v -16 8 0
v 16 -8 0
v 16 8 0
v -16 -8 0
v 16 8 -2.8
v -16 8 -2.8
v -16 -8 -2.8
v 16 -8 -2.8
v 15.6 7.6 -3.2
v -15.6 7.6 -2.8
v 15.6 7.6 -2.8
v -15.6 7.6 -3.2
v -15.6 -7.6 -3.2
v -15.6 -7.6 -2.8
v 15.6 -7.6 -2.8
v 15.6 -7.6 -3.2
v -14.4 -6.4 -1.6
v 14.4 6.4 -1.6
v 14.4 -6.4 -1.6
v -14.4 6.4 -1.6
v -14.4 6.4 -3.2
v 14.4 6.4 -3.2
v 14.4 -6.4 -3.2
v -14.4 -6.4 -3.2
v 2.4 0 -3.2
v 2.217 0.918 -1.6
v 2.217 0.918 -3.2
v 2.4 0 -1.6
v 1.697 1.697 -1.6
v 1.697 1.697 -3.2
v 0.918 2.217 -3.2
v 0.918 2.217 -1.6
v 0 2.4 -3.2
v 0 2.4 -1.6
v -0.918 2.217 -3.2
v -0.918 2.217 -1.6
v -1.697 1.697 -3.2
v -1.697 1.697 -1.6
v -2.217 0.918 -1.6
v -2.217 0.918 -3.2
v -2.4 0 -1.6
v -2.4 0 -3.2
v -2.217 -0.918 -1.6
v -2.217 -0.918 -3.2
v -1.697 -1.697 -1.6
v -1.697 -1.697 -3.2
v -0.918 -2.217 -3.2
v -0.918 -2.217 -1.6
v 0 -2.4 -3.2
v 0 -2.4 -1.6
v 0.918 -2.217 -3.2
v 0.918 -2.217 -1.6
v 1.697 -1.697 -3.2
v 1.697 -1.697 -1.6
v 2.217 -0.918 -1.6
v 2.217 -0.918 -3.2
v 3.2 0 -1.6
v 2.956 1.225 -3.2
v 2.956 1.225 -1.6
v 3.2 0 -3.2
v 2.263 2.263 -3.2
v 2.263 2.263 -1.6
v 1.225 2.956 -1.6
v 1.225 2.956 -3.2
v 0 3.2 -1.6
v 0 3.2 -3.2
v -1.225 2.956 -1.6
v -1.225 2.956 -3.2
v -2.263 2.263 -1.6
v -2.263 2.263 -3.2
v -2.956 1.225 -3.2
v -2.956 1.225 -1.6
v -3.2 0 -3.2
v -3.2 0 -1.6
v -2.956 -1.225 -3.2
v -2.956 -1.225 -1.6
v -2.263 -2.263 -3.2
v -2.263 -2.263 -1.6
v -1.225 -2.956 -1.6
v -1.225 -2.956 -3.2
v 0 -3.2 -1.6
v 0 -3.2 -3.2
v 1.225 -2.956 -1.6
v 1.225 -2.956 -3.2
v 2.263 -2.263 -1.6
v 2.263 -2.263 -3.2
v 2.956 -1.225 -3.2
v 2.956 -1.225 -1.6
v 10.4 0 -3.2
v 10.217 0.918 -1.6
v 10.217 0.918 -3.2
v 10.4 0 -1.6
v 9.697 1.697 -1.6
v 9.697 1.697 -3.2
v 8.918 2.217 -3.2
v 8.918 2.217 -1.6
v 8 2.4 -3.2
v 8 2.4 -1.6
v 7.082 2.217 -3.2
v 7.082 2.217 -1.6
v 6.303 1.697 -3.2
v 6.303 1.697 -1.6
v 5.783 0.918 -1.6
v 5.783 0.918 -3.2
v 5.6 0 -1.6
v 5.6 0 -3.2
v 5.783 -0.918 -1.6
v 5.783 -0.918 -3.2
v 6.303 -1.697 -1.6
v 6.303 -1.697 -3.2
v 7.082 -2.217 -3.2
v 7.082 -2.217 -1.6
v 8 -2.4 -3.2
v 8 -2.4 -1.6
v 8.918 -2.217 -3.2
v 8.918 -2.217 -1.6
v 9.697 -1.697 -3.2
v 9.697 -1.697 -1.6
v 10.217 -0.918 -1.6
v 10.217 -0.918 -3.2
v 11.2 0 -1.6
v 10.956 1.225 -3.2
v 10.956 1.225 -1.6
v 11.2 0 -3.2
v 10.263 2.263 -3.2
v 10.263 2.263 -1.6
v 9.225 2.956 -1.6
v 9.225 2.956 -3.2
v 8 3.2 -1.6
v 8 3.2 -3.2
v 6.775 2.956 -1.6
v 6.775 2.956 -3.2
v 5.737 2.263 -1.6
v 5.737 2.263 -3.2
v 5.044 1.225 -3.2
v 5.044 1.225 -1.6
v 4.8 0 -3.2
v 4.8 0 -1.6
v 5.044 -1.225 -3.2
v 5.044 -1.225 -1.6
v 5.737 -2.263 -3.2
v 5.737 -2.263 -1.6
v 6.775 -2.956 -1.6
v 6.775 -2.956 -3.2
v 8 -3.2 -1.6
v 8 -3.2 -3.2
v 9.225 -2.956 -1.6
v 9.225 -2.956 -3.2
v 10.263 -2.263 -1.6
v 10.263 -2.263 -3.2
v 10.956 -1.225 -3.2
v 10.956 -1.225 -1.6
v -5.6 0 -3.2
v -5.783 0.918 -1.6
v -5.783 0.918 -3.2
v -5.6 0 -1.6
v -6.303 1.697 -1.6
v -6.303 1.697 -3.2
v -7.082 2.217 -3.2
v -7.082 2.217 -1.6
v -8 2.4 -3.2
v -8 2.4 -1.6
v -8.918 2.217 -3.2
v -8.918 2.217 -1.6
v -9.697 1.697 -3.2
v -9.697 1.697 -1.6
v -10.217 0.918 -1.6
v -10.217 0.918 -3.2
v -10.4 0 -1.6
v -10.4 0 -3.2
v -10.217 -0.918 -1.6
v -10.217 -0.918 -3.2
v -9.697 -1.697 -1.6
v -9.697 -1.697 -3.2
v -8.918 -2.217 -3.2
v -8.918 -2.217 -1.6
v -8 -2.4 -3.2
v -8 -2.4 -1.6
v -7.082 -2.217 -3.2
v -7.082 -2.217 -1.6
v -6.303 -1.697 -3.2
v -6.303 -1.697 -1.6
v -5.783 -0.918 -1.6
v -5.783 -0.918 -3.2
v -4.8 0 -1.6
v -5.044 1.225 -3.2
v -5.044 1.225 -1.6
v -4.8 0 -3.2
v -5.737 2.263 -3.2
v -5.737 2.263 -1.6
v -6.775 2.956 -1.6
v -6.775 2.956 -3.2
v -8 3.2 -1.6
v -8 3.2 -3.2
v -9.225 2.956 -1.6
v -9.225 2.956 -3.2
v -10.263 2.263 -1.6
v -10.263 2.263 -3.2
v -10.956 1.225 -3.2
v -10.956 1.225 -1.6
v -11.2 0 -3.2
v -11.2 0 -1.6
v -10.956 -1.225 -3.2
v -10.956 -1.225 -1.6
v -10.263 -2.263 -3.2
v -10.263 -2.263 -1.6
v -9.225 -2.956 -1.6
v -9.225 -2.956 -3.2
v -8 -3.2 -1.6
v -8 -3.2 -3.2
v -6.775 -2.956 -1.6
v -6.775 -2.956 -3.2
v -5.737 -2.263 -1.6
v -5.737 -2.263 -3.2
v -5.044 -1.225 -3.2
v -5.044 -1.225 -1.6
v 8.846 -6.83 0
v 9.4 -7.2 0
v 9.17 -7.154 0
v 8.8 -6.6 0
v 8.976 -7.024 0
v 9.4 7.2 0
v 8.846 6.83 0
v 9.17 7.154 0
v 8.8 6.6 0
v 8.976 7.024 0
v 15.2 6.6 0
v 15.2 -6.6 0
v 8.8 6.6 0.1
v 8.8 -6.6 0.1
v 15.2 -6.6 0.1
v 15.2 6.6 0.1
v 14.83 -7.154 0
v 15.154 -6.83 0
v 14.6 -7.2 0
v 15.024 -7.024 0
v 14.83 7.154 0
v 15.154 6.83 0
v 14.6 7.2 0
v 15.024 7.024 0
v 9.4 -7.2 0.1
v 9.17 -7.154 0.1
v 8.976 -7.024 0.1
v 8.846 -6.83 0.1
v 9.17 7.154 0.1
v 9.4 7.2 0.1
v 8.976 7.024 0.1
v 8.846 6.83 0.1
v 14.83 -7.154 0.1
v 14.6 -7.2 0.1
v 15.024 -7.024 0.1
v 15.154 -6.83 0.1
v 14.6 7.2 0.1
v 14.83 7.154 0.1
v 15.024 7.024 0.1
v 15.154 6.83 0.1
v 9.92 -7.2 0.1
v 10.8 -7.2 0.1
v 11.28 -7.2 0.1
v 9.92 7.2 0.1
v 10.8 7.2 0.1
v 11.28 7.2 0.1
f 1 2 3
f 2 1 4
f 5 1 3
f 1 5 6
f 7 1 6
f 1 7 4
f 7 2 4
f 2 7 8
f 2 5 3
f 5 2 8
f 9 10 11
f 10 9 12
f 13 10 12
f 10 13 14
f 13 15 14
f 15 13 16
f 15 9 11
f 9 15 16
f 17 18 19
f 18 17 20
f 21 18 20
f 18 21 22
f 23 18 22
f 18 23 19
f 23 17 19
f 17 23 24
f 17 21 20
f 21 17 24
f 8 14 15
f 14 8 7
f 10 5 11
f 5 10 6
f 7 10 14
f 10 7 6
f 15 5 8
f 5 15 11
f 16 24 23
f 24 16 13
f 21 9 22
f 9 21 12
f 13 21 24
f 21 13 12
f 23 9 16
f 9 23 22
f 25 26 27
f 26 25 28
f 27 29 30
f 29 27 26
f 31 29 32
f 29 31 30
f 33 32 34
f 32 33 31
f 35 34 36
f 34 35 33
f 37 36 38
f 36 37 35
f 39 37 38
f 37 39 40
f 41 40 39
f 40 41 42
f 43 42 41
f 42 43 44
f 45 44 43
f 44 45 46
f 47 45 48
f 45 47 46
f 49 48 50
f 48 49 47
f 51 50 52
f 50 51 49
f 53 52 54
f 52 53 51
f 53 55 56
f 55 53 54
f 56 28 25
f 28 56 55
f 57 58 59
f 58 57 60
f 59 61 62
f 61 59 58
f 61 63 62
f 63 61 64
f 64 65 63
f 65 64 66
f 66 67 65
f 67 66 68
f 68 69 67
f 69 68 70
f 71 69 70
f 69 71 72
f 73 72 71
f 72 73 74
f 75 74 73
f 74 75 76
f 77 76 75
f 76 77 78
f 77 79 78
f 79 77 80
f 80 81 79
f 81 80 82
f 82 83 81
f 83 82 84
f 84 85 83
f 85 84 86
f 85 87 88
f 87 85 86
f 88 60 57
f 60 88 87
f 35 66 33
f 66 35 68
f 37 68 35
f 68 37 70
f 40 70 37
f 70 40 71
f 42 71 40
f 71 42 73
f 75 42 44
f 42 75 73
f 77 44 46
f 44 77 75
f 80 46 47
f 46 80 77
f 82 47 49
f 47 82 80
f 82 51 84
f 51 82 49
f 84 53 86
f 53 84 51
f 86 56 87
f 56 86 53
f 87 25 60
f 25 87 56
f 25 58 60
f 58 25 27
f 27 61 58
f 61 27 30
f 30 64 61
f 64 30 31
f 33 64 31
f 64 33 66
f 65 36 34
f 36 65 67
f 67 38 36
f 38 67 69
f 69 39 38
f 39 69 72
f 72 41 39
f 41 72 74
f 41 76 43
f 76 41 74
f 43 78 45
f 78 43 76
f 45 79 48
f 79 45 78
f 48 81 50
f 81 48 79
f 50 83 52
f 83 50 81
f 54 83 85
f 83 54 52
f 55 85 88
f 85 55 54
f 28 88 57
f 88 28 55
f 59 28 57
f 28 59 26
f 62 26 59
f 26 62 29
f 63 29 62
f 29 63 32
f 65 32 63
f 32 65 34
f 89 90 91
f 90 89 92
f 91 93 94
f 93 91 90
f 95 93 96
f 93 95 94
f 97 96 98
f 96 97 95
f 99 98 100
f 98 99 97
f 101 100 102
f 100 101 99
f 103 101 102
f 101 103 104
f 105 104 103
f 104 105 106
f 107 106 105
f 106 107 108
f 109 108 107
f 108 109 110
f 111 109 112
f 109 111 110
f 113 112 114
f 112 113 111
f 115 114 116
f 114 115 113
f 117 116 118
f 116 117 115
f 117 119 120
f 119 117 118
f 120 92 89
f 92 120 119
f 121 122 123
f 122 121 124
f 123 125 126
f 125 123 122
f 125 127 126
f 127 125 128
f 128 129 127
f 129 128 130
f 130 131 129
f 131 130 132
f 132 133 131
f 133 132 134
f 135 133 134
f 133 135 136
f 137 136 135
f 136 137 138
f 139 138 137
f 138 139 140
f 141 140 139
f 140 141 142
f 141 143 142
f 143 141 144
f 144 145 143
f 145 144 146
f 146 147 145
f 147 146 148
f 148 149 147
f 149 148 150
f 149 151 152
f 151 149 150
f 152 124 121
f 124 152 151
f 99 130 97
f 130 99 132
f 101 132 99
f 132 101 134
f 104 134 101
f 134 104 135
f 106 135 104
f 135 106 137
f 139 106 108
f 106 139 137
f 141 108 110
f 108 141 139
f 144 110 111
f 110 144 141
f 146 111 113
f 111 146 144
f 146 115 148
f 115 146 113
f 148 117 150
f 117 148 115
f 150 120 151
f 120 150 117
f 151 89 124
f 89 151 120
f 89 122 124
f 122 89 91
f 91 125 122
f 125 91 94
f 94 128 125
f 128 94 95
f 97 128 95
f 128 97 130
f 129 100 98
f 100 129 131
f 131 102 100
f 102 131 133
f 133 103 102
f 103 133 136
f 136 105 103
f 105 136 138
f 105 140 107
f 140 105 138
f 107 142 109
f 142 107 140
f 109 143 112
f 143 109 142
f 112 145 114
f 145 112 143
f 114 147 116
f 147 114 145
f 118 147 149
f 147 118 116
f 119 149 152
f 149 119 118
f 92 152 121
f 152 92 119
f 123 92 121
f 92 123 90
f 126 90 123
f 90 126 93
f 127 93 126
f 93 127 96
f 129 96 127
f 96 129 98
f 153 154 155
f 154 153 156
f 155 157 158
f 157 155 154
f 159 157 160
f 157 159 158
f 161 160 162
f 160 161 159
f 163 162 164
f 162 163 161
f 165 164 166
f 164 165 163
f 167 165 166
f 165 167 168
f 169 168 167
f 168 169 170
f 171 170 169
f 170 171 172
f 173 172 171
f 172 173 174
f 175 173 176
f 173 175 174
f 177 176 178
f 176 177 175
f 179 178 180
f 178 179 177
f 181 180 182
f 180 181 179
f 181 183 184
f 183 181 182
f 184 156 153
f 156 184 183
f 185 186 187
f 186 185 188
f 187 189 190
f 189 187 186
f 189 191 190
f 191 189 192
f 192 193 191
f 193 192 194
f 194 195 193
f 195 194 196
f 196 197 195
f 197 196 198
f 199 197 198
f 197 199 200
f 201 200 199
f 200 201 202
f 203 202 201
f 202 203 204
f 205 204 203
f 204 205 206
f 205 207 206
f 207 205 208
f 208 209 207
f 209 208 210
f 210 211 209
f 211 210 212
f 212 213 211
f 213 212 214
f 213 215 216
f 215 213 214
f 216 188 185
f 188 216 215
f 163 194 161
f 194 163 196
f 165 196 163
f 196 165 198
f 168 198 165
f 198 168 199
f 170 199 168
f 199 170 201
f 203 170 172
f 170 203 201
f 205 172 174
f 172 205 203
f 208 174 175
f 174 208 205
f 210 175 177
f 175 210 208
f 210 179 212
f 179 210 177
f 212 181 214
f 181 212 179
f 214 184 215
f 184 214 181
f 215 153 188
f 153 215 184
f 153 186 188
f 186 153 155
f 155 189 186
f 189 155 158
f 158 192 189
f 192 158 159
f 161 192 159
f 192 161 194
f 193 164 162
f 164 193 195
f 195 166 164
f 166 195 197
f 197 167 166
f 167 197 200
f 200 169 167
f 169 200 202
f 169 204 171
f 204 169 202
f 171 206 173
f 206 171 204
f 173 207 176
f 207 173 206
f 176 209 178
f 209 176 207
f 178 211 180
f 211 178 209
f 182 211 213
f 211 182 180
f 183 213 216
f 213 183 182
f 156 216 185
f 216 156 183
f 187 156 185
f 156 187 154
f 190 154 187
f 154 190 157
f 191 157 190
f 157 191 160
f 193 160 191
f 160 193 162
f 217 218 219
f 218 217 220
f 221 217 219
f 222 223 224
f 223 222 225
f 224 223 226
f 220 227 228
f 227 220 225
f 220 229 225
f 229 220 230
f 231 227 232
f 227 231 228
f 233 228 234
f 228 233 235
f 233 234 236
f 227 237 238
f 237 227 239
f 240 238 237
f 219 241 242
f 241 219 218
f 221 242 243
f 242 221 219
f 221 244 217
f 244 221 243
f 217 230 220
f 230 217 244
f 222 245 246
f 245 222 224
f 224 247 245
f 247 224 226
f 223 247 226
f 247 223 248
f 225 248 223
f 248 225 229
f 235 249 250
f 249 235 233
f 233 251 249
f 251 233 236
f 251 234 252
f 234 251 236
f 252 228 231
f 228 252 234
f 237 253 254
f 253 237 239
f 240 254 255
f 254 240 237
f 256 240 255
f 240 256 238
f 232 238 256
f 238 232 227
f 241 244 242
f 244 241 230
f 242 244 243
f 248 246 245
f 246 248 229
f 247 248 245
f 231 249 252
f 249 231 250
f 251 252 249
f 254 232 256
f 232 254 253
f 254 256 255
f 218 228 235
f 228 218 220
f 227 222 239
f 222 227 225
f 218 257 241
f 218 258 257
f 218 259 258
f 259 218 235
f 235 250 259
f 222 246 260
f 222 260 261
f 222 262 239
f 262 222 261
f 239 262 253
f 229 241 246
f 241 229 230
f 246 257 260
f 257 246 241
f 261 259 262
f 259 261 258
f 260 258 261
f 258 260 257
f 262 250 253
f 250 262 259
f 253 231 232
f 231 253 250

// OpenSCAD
// file: ../p/4-4ring3.scad
use <../lib.scad>
$fa=1; $fs=0.2;
function ldraw_lib__4_4ring3(realsolid=false) = [
// 0 Ring  3 x 1.0
// 0 Name: 4-4ring3.dat
// 0 Author: James Jessiman
// 0 !LDRAW_ORG Primitive UPDATE 2009-01
// 0 !LICENSE Licensed under CC BY 2.0 and CC BY 4.0 : see CAreadme.txt
// 
// 0 BFC CERTIFY CCW
  [0,"BFC","CERTIFY"],
  [0,"BFC","CCW"],
// 
// 0 !HISTORY 1998-12-15 [PTadmin] Official Update 1998-10
// 0 !HISTORY 2002-04-05 [hafhead] Added BFC statement
// 0 !HISTORY 2002-04-25 [PTadmin] Official Update 2002-02
// 0 !HISTORY 2007-06-24 [PTadmin] Header formatted for Contributor Agreement
// 0 !HISTORY 2008-07-01 [PTadmin] Official Update 2008-01
// 0 !HISTORY 2008-08-26 [cwdee] Switch polygon winding and rename
// 0 !HISTORY 2009-05-02 [PTadmin] Official Update 2009-01
// 
// 
// 4 16 -1.5308 0 3.6956 -1.1481 0 2.7717 0 0 3 0 0 4
  [4,16,-1.5308,0,3.6956,-1.1481,0,2.7717,0,0,3,0,0,4],
// 4 16 -2.8284 0 2.8284 -2.1213 0 2.1213 -1.1481 0 2.7717 -1.5308 0 3.6956
  [4,16,-2.8284,0,2.8284,-2.1213,0,2.1213,-1.1481,0,2.7717,-1.5308,0,3.6956],
// 4 16 -3.6956 0 1.5308 -2.7717 0 1.1481 -2.1213 0 2.1213 -2.8284 0 2.8284
  [4,16,-3.6956,0,1.5308,-2.7717,0,1.1481,-2.1213,0,2.1213,-2.8284,0,2.8284],
// 4 16 -4 0 0 -3 0 0 -2.7717 0 1.1481 -3.6956 0 1.5308
  [4,16,-4,0,0,-3,0,0,-2.7717,0,1.1481,-3.6956,0,1.5308],
// 4 16 -3.6956 0 -1.5308 -2.7717 0 -1.1481 -3 0 0 -4 0 0
  [4,16,-3.6956,0,-1.5308,-2.7717,0,-1.1481,-3,0,0,-4,0,0],
// 4 16 -2.8284 0 -2.8284 -2.1213 0 -2.1213 -2.7717 0 -1.1481 -3.6956 0 -1.5308
  [4,16,-2.8284,0,-2.8284,-2.1213,0,-2.1213,-2.7717,0,-1.1481,-3.6956,0,-1.5308],
// 4 16 -1.5308 0 -3.6956 -1.1481 0 -2.7717 -2.1213 0 -2.1213 -2.8284 0 -2.8284
  [4,16,-1.5308,0,-3.6956,-1.1481,0,-2.7717,-2.1213,0,-2.1213,-2.8284,0,-2.8284],
// 4 16 0 0 -4 0 0 -3 -1.1481 0 -2.7717 -1.5308 0 -3.6956
  [4,16,0,0,-4,0,0,-3,-1.1481,0,-2.7717,-1.5308,0,-3.6956],
// 4 16 1.5308 0 -3.6956 1.1481 0 -2.7717 0 0 -3 0 0 -4
  [4,16,1.5308,0,-3.6956,1.1481,0,-2.7717,0,0,-3,0,0,-4],
// 4 16 2.8284 0 -2.8284 2.1213 0 -2.1213 1.1481 0 -2.7717 1.5308 0 -3.6956
  [4,16,2.8284,0,-2.8284,2.1213,0,-2.1213,1.1481,0,-2.7717,1.5308,0,-3.6956],
// 4 16 3.6956 0 -1.5308 2.7717 0 -1.1481 2.1213 0 -2.1213 2.8284 0 -2.8284
  [4,16,3.6956,0,-1.5308,2.7717,0,-1.1481,2.1213,0,-2.1213,2.8284,0,-2.8284],
// 4 16 4 0 0 3 0 0 2.7717 0 -1.1481 3.6956 0 -1.5308
  [4,16,4,0,0,3,0,0,2.7717,0,-1.1481,3.6956,0,-1.5308],
// 4 16 3.6956 0 1.5308 2.7717 0 1.1481 3 0 0 4 0 0
  [4,16,3.6956,0,1.5308,2.7717,0,1.1481,3,0,0,4,0,0],
// 4 16 2.8284 0 2.8284 2.1213 0 2.1213 2.7717 0 1.1481 3.6956 0 1.5308
  [4,16,2.8284,0,2.8284,2.1213,0,2.1213,2.7717,0,1.1481,3.6956,0,1.5308],
// 4 16 1.5308 0 3.6956 1.1481 0 2.7717 2.1213 0 2.1213 2.8284 0 2.8284
  [4,16,1.5308,0,3.6956,1.1481,0,2.7717,2.1213,0,2.1213,2.8284,0,2.8284],
// 4 16 0 0 4 0 0 3 1.1481 0 2.7717 1.5308 0 3.6956
  [4,16,0,0,4,0,0,3,1.1481,0,2.7717,1.5308,0,3.6956],
// 0
];
module ldraw_lib__4_4ring3(step=0, col=false, unit=2/5, alt=false, line=0.2, solid=!$preview)
    makepoly(ldraw_lib__4_4ring3(solid), step=step, col=col, unit=unit, alt=alt, line=line, solid=solid);
ldraw_lib__4_4ring3(line=0.2);
// file: ../p/4-4edge.scad
use <../lib.scad>
function ldraw_lib__4_4edge() = [
// 0 Circle 1.0
// 0 Name: 4-4edge.dat
// 0 Author: James Jessiman
// 0 !LDRAW_ORG Primitive UPDATE 2017-01
// 0 !LICENSE Licensed under CC BY 2.0 and CC BY 4.0 : see CAreadme.txt
// 
// 0 BFC CERTIFY CCW
  [0,"BFC","CERTIFY"],
  [0,"BFC","CCW"],
// 
// 0 !HISTORY 1998-12-15 [PTadmin] Official Update 1998-10
// 0 !HISTORY 2005-12-28 [PTadmin] Official Update 2005-01
// 0 !HISTORY 2007-06-24 [PTadmin] Header formatted for Contributor Agreement
// 0 !HISTORY 2008-07-01 [PTadmin] Official Update 2008-01
// 0 !HISTORY 2017-01-15 [Steffen] BFCed
// 0 !HISTORY 2017-12-30 [PTadmin] Official Update 2017-01
// 
// 
// 2 24 1 0 0 0.9239 0 0.3827
  [2,24,1,0,0,0.9239,0,0.3827],
// 2 24 0.9239 0 0.3827 0.7071 0 0.7071
  [2,24,0.9239,0,0.3827,0.7071,0,0.7071],
// 2 24 0.7071 0 0.7071 0.3827 0 0.9239
  [2,24,0.7071,0,0.7071,0.3827,0,0.9239],
// 2 24 0.3827 0 0.9239 0 0 1
  [2,24,0.3827,0,0.9239,0,0,1],
// 2 24 0 0 1 -0.3827 0 0.9239
  [2,24,0,0,1,-0.3827,0,0.9239],
// 2 24 -0.3827 0 0.9239 -0.7071 0 0.7071
  [2,24,-0.3827,0,0.9239,-0.7071,0,0.7071],
// 2 24 -0.7071 0 0.7071 -0.9239 0 0.3827
  [2,24,-0.7071,0,0.7071,-0.9239,0,0.3827],
// 2 24 -0.9239 0 0.3827 -1 0 -0
  [2,24,-0.9239,0,0.3827,-1,0,-0],
// 2 24 -1 0 -0 -0.9239 0 -0.3827
  [2,24,-1,0,-0,-0.9239,0,-0.3827],
// 2 24 -0.9239 0 -0.3827 -0.7071 0 -0.7071
  [2,24,-0.9239,0,-0.3827,-0.7071,0,-0.7071],
// 2 24 -0.7071 0 -0.7071 -0.3827 0 -0.9239
  [2,24,-0.7071,0,-0.7071,-0.3827,0,-0.9239],
// 2 24 -0.3827 0 -0.9239 0 0 -1
  [2,24,-0.3827,0,-0.9239,0,0,-1],
// 2 24 0 0 -1 0.3827 0 -0.9239
  [2,24,0,0,-1,0.3827,0,-0.9239],
// 2 24 0.3827 0 -0.9239 0.7071 0 -0.7071
  [2,24,0.3827,0,-0.9239,0.7071,0,-0.7071],
// 2 24 0.7071 0 -0.7071 0.9239 0 -0.3827
  [2,24,0.7071,0,-0.7071,0.9239,0,-0.3827],
// 2 24 0.9239 0 -0.3827 1 0 0
  [2,24,0.9239,0,-0.3827,1,0,0],
];
module ldraw_lib__4_4edge(step=0, col=false, unit=2/5, alt=false, line=0.2, solid=!$preview)
    makepoly(ldraw_lib__4_4edge(), step=step, col=col, unit=unit, alt=alt, line=line, solid=solid);
ldraw_lib__4_4edge(line=0.2);
// file: ../p/4-4cyli.scad
use <../lib.scad>
$fa=1; $fs=0.2;
function ldraw_lib__4_4cyli(realsolid=false) = [
// 0 Cylinder 1.0
// 0 Name: 4-4cyli.dat
// 0 Author: James Jessiman
// 0 !LDRAW_ORG Primitive UPDATE 2005-01
// 0 !LICENSE Licensed under CC BY 2.0 and CC BY 4.0 : see CAreadme.txt
// 
// 0 BFC CERTIFY CCW
  [0,"BFC","CERTIFY"],
  [0,"BFC","CCW"],
// 
// 0 !HISTORY 1998-12-15 [PTadmin] Official Update 1998-10
// 0 !HISTORY 2002-03-23 [sbliss] Added BFC statement; merged headers from files in distributions LDraw 0.27 and Complete.
// 0 !HISTORY 2002-04-25 [PTadmin] Official Update 2002-02
// 0 !HISTORY 2004-12-14 [guyvivan] BFC CCW
// 0 !HISTORY 2005-12-28 [PTadmin] Official Update 2005-01
// 0 !HISTORY 2007-06-24 [PTadmin] Header formatted for Contributor Agreement
// 0 !HISTORY 2008-07-01 [PTadmin] Official Update 2008-01
// 
// 
// 4 16 1 1 0 0.9239 1 0.3827 0.9239 0 0.3827 1 0 0
  [4,16,1,1,0,0.9239,1,0.3827,0.9239,0,0.3827,1,0,0],
// 5 24 1 0 0 1 1 0 0.9239 0 0.3827 0.9239 0 -0.3827
  [5,24,1,0,0,1,1,0,0.9239,0,0.3827,0.9239,0,-0.3827],
// 4 16 0.9239 1 0.3827 0.7071 1 0.7071 0.7071 0 0.7071 0.9239 0 0.3827
  [4,16,0.9239,1,0.3827,0.7071,1,0.7071,0.7071,0,0.7071,0.9239,0,0.3827],
// 5 24 0.9239 0 0.3827 0.9239 1 0.3827 0.7071 0 0.7071 1 0 0
  [5,24,0.9239,0,0.3827,0.9239,1,0.3827,0.7071,0,0.7071,1,0,0],
// 4 16 0.7071 1 0.7071 0.3827 1 0.9239 0.3827 0 0.9239 0.7071 0 0.7071
  [4,16,0.7071,1,0.7071,0.3827,1,0.9239,0.3827,0,0.9239,0.7071,0,0.7071],
// 5 24 0.7071 0 0.7071 0.7071 1 0.7071 0.3827 0 0.9239 0.9239 0 0.3827
  [5,24,0.7071,0,0.7071,0.7071,1,0.7071,0.3827,0,0.9239,0.9239,0,0.3827],
// 4 16 0.3827 1 0.9239 0 1 1 0 0 1 0.3827 0 0.9239
  [4,16,0.3827,1,0.9239,0,1,1,0,0,1,0.3827,0,0.9239],
// 5 24 0.3827 0 0.9239 0.3827 1 0.9239 0 0 1 0.7071 0 0.7071
  [5,24,0.3827,0,0.9239,0.3827,1,0.9239,0,0,1,0.7071,0,0.7071],
// 4 16 0 1 1 -0.3827 1 0.9239 -0.3827 0 0.9239 0 0 1
  [4,16,0,1,1,-0.3827,1,0.9239,-0.3827,0,0.9239,0,0,1],
// 5 24 0 0 1 0 1 1 -0.3827 0 0.9239 0.3827 0 0.9239
  [5,24,0,0,1,0,1,1,-0.3827,0,0.9239,0.3827,0,0.9239],
// 4 16 -0.3827 1 0.9239 -0.7071 1 0.7071 -0.7071 0 0.7071 -0.3827 0 0.9239
  [4,16,-0.3827,1,0.9239,-0.7071,1,0.7071,-0.7071,0,0.7071,-0.3827,0,0.9239],
// 5 24 -0.3827 0 0.9239 -0.3827 1 0.9239 -0.7071 0 0.7071 0 0 1
  [5,24,-0.3827,0,0.9239,-0.3827,1,0.9239,-0.7071,0,0.7071,0,0,1],
// 4 16 -0.7071 1 0.7071 -0.9239 1 0.3827 -0.9239 0 0.3827 -0.7071 0 0.7071
  [4,16,-0.7071,1,0.7071,-0.9239,1,0.3827,-0.9239,0,0.3827,-0.7071,0,0.7071],
// 5 24 -0.7071 0 0.7071 -0.7071 1 0.7071 -0.9239 0 0.3827 -0.3827 0 0.9239
  [5,24,-0.7071,0,0.7071,-0.7071,1,0.7071,-0.9239,0,0.3827,-0.3827,0,0.9239],
// 4 16 -0.9239 1 0.3827 -1 1 0 -1 0 0 -0.9239 0 0.3827
  [4,16,-0.9239,1,0.3827,-1,1,0,-1,0,0,-0.9239,0,0.3827],
// 5 24 -0.9239 0 0.3827 -0.9239 1 0.3827 -1 0 0 -0.7071 0 0.7071
  [5,24,-0.9239,0,0.3827,-0.9239,1,0.3827,-1,0,0,-0.7071,0,0.7071],
// 4 16 -1 1 0 -0.9239 1 -0.3827 -0.9239 0 -0.3827 -1 0 0
  [4,16,-1,1,0,-0.9239,1,-0.3827,-0.9239,0,-0.3827,-1,0,0],
// 5 24 -1 0 0 -1 1 0 -0.9239 0 -0.3827 -0.9239 0 0.3827
  [5,24,-1,0,0,-1,1,0,-0.9239,0,-0.3827,-0.9239,0,0.3827],
// 4 16 -0.9239 1 -0.3827 -0.7071 1 -0.7071 -0.7071 0 -0.7071 -0.9239 0 -0.3827
  [4,16,-0.9239,1,-0.3827,-0.7071,1,-0.7071,-0.7071,0,-0.7071,-0.9239,0,-0.3827],
// 5 24 -0.9239 0 -0.3827 -0.9239 1 -0.3827 -0.7071 0 -0.7071 -1 0 0
  [5,24,-0.9239,0,-0.3827,-0.9239,1,-0.3827,-0.7071,0,-0.7071,-1,0,0],
// 4 16 -0.7071 1 -0.7071 -0.3827 1 -0.9239 -0.3827 0 -0.9239 -0.7071 0 -0.7071
  [4,16,-0.7071,1,-0.7071,-0.3827,1,-0.9239,-0.3827,0,-0.9239,-0.7071,0,-0.7071],
// 5 24 -0.7071 0 -0.7071 -0.7071 1 -0.7071 -0.3827 0 -0.9239 -0.9239 0 -0.3827
  [5,24,-0.7071,0,-0.7071,-0.7071,1,-0.7071,-0.3827,0,-0.9239,-0.9239,0,-0.3827],
// 4 16 -0.3827 1 -0.9239 0 1 -1 0 0 -1 -0.3827 0 -0.9239
  [4,16,-0.3827,1,-0.9239,0,1,-1,0,0,-1,-0.3827,0,-0.9239],
// 5 24 -0.3827 0 -0.9239 -0.3827 1 -0.9239 0 0 -1 -0.7071 0 -0.7071
  [5,24,-0.3827,0,-0.9239,-0.3827,1,-0.9239,0,0,-1,-0.7071,0,-0.7071],
// 4 16 0 1 -1 0.3827 1 -0.9239 0.3827 0 -0.9239 0 0 -1
  [4,16,0,1,-1,0.3827,1,-0.9239,0.3827,0,-0.9239,0,0,-1],
// 5 24 0 0 -1 0 1 -1 0.3827 0 -0.9239 -0.3827 0 -0.9239
  [5,24,0,0,-1,0,1,-1,0.3827,0,-0.9239,-0.3827,0,-0.9239],
// 4 16 0.3827 1 -0.9239 0.7071 1 -0.7071 0.7071 0 -0.7071 0.3827 0 -0.9239
  [4,16,0.3827,1,-0.9239,0.7071,1,-0.7071,0.7071,0,-0.7071,0.3827,0,-0.9239],
// 5 24 0.3827 0 -0.9239 0.3827 1 -0.9239 0.7071 0 -0.7071 0 0 -1
  [5,24,0.3827,0,-0.9239,0.3827,1,-0.9239,0.7071,0,-0.7071,0,0,-1],
// 4 16 0.7071 1 -0.7071 0.9239 1 -0.3827 0.9239 0 -0.3827 0.7071 0 -0.7071
  [4,16,0.7071,1,-0.7071,0.9239,1,-0.3827,0.9239,0,-0.3827,0.7071,0,-0.7071],
// 5 24 0.7071 0 -0.7071 0.7071 1 -0.7071 0.9239 0 -0.3827 0.3827 0 -0.9239
  [5,24,0.7071,0,-0.7071,0.7071,1,-0.7071,0.9239,0,-0.3827,0.3827,0,-0.9239],
// 4 16 0.9239 1 -0.3827 1 1 0 1 0 0 0.9239 0 -0.3827
  [4,16,0.9239,1,-0.3827,1,1,0,1,0,0,0.9239,0,-0.3827],
// 5 24 0.9239 0 -0.3827 0.9239 1 -0.3827 1 0 0 0.7071 0 -0.7071
  [5,24,0.9239,0,-0.3827,0.9239,1,-0.3827,1,0,0,0.7071,0,-0.7071],
// 0
];
module ldraw_lib__4_4cyli(step=0, col=false, unit=2/5, alt=false, line=0.2, solid=!$preview)
    makepoly(ldraw_lib__4_4cyli(solid), step=step, col=col, unit=unit, alt=alt, line=line, solid=solid);
ldraw_lib__4_4cyli(line=0.2);
// file: ../p/stud4.scad
use <../lib.scad>
use <4-4cyli.scad>
use <4-4edge.scad>
use <4-4ring3.scad>
function ldraw_lib__stud4() = [
// 0 Stud Tube Open
// 0 Name: stud4.dat
// 0 Author: James Jessiman
// 0 !LDRAW_ORG Primitive UPDATE 2009-02
// 0 !LICENSE Licensed under CC BY 4.0 : see CAreadme.txt
// 
// 0 BFC CERTIFY CCW
  [0,"BFC","CERTIFY"],
  [0,"BFC","CCW"],
// 
// 0 !HISTORY 1999-07-05 [PTadmin] Official Update 1999-05
// 0 !HISTORY 2002-04-04 [sbliss] Modified for BFC compliance
// 0 !HISTORY 2002-04-25 [PTadmin] Official Update 2002-02
// 0 !HISTORY 2007-06-24 [PTadmin] Header formatted for Contributor Agreement
// 0 !HISTORY 2008-07-01 [PTadmin] Official Update 2008-01
// 0 !HISTORY 2009-06-21 [cwdee] Update ring references to 4-4ring
// 0 !HISTORY 2009-09-03 [PTadmin] Official Update 2009-02
// 
// 
// 1 16 0 -4 0 6 0 0 0 1 0 0 0 6 4-4edge.dat
  [1,16,0,-4,0,6,0,0,0,1,0,0,0,6, ldraw_lib__4_4edge()],
// 1 16 0 -4 0 8 0 0 0 1 0 0 0 8 4-4edge.dat
  [1,16,0,-4,0,8,0,0,0,1,0,0,0,8, ldraw_lib__4_4edge()],
// 1 16 0 0 0 6 0 0 0 1 0 0 0 6 4-4edge.dat
  [1,16,0,0,0,6,0,0,0,1,0,0,0,6, ldraw_lib__4_4edge()],
// 1 16 0 0 0 8 0 0 0 1 0 0 0 8 4-4edge.dat
  [1,16,0,0,0,8,0,0,0,1,0,0,0,8, ldraw_lib__4_4edge()],
// 0 BFC INVERTNEXT
  [0,"BFC","INVERTNEXT"],
// 1 16 0 -4 0 6 0 0 0 4 0 0 0 6 4-4cyli.dat
  [1,16,0,-4,0,6,0,0,0,4,0,0,0,6, ldraw_lib__4_4cyli()],
// 1 16 0 -4 0 8 0 0 0 4 0 0 0 8 4-4cyli.dat
  [1,16,0,-4,0,8,0,0,0,4,0,0,0,8, ldraw_lib__4_4cyli()],
// 1 16 0 -4 0 2 0 0 0 1 0 0 0 2 4-4ring3.dat
  [1,16,0,-4,0,2,0,0,0,1,0,0,0,2, ldraw_lib__4_4ring3()],
  [-1,16,0,0,0,2,0,0,0,-1,0,0,0,2, ldraw_lib__4_4ring3()],
// 0
];
module ldraw_lib__stud4(step=0, col=false, unit=2/5, alt=false, line=0.2, solid=!$preview)
    makepoly(ldraw_lib__stud4(), step=step, col=col, unit=unit, alt=alt, line=line, solid=solid);
ldraw_lib__stud4(line=0.2);
// file: ../p/box5.scad
use <../lib.scad>
function ldraw_lib__box5() = [
// 0 Box with 5 Faces and All Edges
// 0 Name: box5.dat
// 0 Author: James Jessiman
// 0 !LDRAW_ORG Primitive UPDATE 2012-01
// 0 !LICENSE Licensed under CC BY 2.0 and CC BY 4.0 : see CAreadme.txt
// 
// 0 BFC CERTIFY CCW
  [0,"BFC","CERTIFY"],
  [0,"BFC","CCW"],
// 
// 0 !HISTORY 2002-04-03 [sbliss] Modified for BFC compliance
// 0 !HISTORY 2002-04-25 [PTadmin] Official Update 2002-02
// 0 !HISTORY 2007-06-24 [PTadmin] Header formatted for Contributor Agreement
// 0 !HISTORY 2008-07-01 [PTadmin] Official Update 2008-01
// 0 !HISTORY 2012-02-16 [Philo] Changed to CCW
// 0 !HISTORY 2012-03-30 [PTadmin] Official Update 2012-01
// 
// 
// 2 24 1 1 1 -1 1 1
  [2,24,1,1,1,-1,1,1],
// 2 24 -1 1 1 -1 1 -1
  [2,24,-1,1,1,-1,1,-1],
// 2 24 -1 1 -1 1 1 -1
  [2,24,-1,1,-1,1,1,-1],
// 2 24 1 1 -1 1 1 1
  [2,24,1,1,-1,1,1,1],
// 2 24 1 0 1 -1 0 1
  [2,24,1,0,1,-1,0,1],
// 2 24 -1 0 1 -1 0 -1
  [2,24,-1,0,1,-1,0,-1],
// 2 24 -1 0 -1 1 0 -1
  [2,24,-1,0,-1,1,0,-1],
// 2 24 1 0 -1 1 0 1
  [2,24,1,0,-1,1,0,1],
// 2 24 1 0 1 1 1 1
  [2,24,1,0,1,1,1,1],
// 2 24 -1 0 1 -1 1 1
  [2,24,-1,0,1,-1,1,1],
// 2 24 1 0 -1 1 1 -1
  [2,24,1,0,-1,1,1,-1],
// 2 24 -1 0 -1 -1 1 -1
  [2,24,-1,0,-1,-1,1,-1],
// 4 16 -1 1 1 1 1 1 1 1 -1 -1 1 -1
  [4,16,-1,1,1,1,1,1,1,1,-1,-1,1,-1],
// 4 16 -1 1 1 -1 0 1 1 0 1 1 1 1
  [4,16,-1,1,1,-1,0,1,1,0,1,1,1,1],
// 4 16 -1 1 -1 -1 0 -1 -1 0 1 -1 1 1
  [4,16,-1,1,-1,-1,0,-1,-1,0,1,-1,1,1],
// 4 16 1 1 -1 1 0 -1 -1 0 -1 -1 1 -1
  [4,16,1,1,-1,1,0,-1,-1,0,-1,-1,1,-1],
// 4 16 1 1 1 1 0 1 1 0 -1 1 1 -1
  [4,16,1,1,1,1,0,1,1,0,-1,1,1,-1],
];
makepoly(ldraw_lib__box5(), line=0.2);
// file: ../p/box4.scad
use <../lib.scad>
function ldraw_lib__box4() = [
// 0 Box with 4 Faces (2 Parallel Pairs) and All Edges
// 0 Name: box4.dat
// 0 Author: James Jessiman
// 0 !LDRAW_ORG Primitive UPDATE 2012-01
// 0 !LICENSE Licensed under CC BY 4.0 : see CAreadme.txt
// 
// 0 BFC CERTIFY CCW
  [0,"BFC","CERTIFY"],
  [0,"BFC","CCW"],
// 
// 0 !HISTORY 2002-04-03 [sbliss] Modified for BFC compliance
// 0 !HISTORY 2002-04-25 [PTadmin] Official Update 2002-02
// 0 !HISTORY 2007-06-24 [PTadmin] Header formatted for Contributor Agreement
// 0 !HISTORY 2008-07-01 [PTadmin] Official Update 2008-01
// 0 !HISTORY 2012-02-16 [Philo] Changed to CCW
// 0 !HISTORY 2012-03-30 [PTadmin] Official Update 2012-01
// 
// 
// 2 24 1 1 1 -1 1 1
  [2,24,1,1,1,-1,1,1],
// 2 24 -1 1 1 -1 1 -1
  [2,24,-1,1,1,-1,1,-1],
// 2 24 -1 1 -1 1 1 -1
  [2,24,-1,1,-1,1,1,-1],
// 2 24 1 1 -1 1 1 1
  [2,24,1,1,-1,1,1,1],
// 2 24 1 0 1 -1 0 1
  [2,24,1,0,1,-1,0,1],
// 2 24 -1 0 1 -1 0 -1
  [2,24,-1,0,1,-1,0,-1],
// 2 24 -1 0 -1 1 0 -1
  [2,24,-1,0,-1,1,0,-1],
// 2 24 1 0 -1 1 0 1
  [2,24,1,0,-1,1,0,1],
// 2 24 1 0 1 1 1 1
  [2,24,1,0,1,1,1,1],
// 2 24 -1 0 1 -1 1 1
  [2,24,-1,0,1,-1,1,1],
// 2 24 1 0 -1 1 1 -1
  [2,24,1,0,-1,1,1,-1],
// 2 24 -1 0 -1 -1 1 -1
  [2,24,-1,0,-1,-1,1,-1],
// 4 16 -1 1 1 -1 0 1 1 0 1 1 1 1
  [4,16,-1,1,1,-1,0,1,1,0,1,1,1,1],
// 4 16 -1 1 -1 -1 0 -1 -1 0 1 -1 1 1
  [4,16,-1,1,-1,-1,0,-1,-1,0,1,-1,1,1],
// 4 16 1 1 -1 1 0 -1 -1 0 -1 -1 1 -1
  [4,16,1,1,-1,1,0,-1,-1,0,-1,-1,1,-1],
// 4 16 1 1 1 1 0 1 1 0 -1 1 1 -1
  [4,16,1,1,1,1,0,1,1,0,-1,1,1,-1],
];
module ldraw_lib__box4(step=0, col=false, unit=2/5, alt=false, line=0.2, solid=!$preview)
    makepoly(ldraw_lib__box4(), step=step, col=col, unit=unit, alt=alt, line=line, solid=solid);
ldraw_lib__box4(line=0.2);
// file: s/87079s01.scad
use <../../lib.scad>
use <../../p/box4.scad>
use <../../p/box5.scad>
use <../../p/stud4.scad>
function ldraw_lib__s__87079s01() = [
// 0 ~Tile  2 x  4 with Groove without Top
// 0 Name: s\87079s01.dat
// 0 Author: Philippe Hurbain [Philo]
// 0 !LDRAW_ORG Subpart UPDATE 2012-03
// 0 !LICENSE Licensed under CC BY 4.0 : see CAreadme.txt
// 
// 0 BFC CERTIFY CCW
  [0,"BFC","CERTIFY"],
  [0,"BFC","CCW"],
// 
// 0 !HISTORY 2012-09-30 [Philo] Subparted from Tim Gould's original design
// 0 !HISTORY 2012-12-28 [PTadmin] Official Update 2012-03
// 
// 
// 1 16 0 0 0 40 0 0 0 7 0 0 0 20 box4.dat
  [1,16,0,0,0,40,0,0,0,7,0,0,0,20, ldraw_lib__box4()],
// 1 16 0 7 0 39 0 0 0 1 0 0 0 19 box4.dat
  [1,16,0,7,0,39,0,0,0,1,0,0,0,19, ldraw_lib__box4()],
// 0 BFC INVERTNEXT
  [0,"BFC","INVERTNEXT"],
// 1 16 0 8 0 -36 0 0 0 -4 0 0 0 16 box5.dat
  [1,16,0,8,0,-36,0,0,0,-4,0,0,0,16, ldraw_lib__box5()],
// 4 16 -40 7 -20 -39 7 -19 39 7 -19 40 7 -20
  [4,16,-40,7,-20,-39,7,-19,39,7,-19,40,7,-20],
// 4 16 40 7 20 39 7 19 -39 7 19 -40 7 20
  [4,16,40,7,20,39,7,19,-39,7,19,-40,7,20],
// 4 16 -40 7 -20 -40 7 20 -39 7 19 -39 7 -19
  [4,16,-40,7,-20,-40,7,20,-39,7,19,-39,7,-19],
// 4 16 40 7 20 40 7 -20 39 7 -19 39 7 19
  [4,16,40,7,20,40,7,-20,39,7,-19,39,7,19],
// 4 16 -39 8 -19 -36 8 -16 36 8 -16 39 8 -19
  [4,16,-39,8,-19,-36,8,-16,36,8,-16,39,8,-19],
// 4 16 39 8 19 36 8 16 -36 8 16 -39 8 19
  [4,16,39,8,19,36,8,16,-36,8,16,-39,8,19],
// 4 16 -39 8 -19 -39 8 19 -36 8 16 -36 8 -16
  [4,16,-39,8,-19,-39,8,19,-36,8,16,-36,8,-16],
// 4 16 39 8 19 39 8 -19 36 8 -16 36 8 16
  [4,16,39,8,19,39,8,-19,36,8,-16,36,8,16],
// 1 16 0 4 0 1 0 0 0 -1 0 0 0 1 stud4.dat
  [1,16,0,4,0,1,0,0,0,-1,0,0,0,1, ldraw_lib__stud4()],
// 1 16 20 4 0 1 0 0 0 -1 0 0 0 1 stud4.dat
  [1,16,20,4,0,1,0,0,0,-1,0,0,0,1, ldraw_lib__stud4()],
// 1 16 -20 4 0 1 0 0 0 -1 0 0 0 1 stud4.dat
  [1,16,-20,4,0,1,0,0,0,-1,0,0,0,1, ldraw_lib__stud4()],
];
module ldraw_lib__s__87079s01(step=0, col=false, unit=2/5, alt=false, line=0.2, solid=!$preview)
    makepoly(ldraw_lib__s__87079s01(), step=step, col=col, unit=unit, alt=alt, line=line, solid=solid);
ldraw_lib__s__87079s01(line=0.2);
// file: ../p/box3u12.scad
use <../lib.scad>
function ldraw_lib__box3u12() = [
// 0 Box with 3 Parallel Faces without Any Edges
// 0 Name: box3u12.dat
// 0 Author: J.C. Tchang [tchang]
// 0 !LDRAW_ORG Primitive UPDATE 2014-02
// 0 !LICENSE Licensed under CC BY 2.0 and CC BY 4.0 : see CAreadme.txt
// 
// 0 BFC CERTIFY CCW
  [0,"BFC","CERTIFY"],
  [0,"BFC","CCW"],
// 
// 0 !HISTORY 2014-12-23 [PTadmin] Official Update 2014-02
// 
// 
// 4 16 -1 1 1 1 1 1 1 1 -1 -1 1 -1
  [4,16,-1,1,1,1,1,1,1,1,-1,-1,1,-1],
// 4 16 -1 1 1 -1 0 1 1 0 1 1 1 1
  [4,16,-1,1,1,-1,0,1,1,0,1,1,1,1],
// 4 16 1 1 -1 1 0 -1 -1 0 -1 -1 1 -1
  [4,16,1,1,-1,1,0,-1,-1,0,-1,-1,1,-1],
];
makepoly(ldraw_lib__box3u12(), line=0.2);
// file: ../p/1-4cyli.scad
use <../lib.scad>
function ldraw_lib__1_4cyli() = [
// 0 Cylinder 0.25
// 0 Name: 1-4cyli.dat
// 0 Author: James Jessiman
// 0 !LDRAW_ORG Primitive UPDATE 2012-01
// 0 !LICENSE Licensed under CC BY 2.0 and CC BY 4.0 : see CAreadme.txt
// 
// 0 BFC CERTIFY CCW
  [0,"BFC","CERTIFY"],
  [0,"BFC","CCW"],
// 
// 0 !HISTORY 2002-03-23 [sbliss] Added BFC statement.
// 0 !HISTORY 2002-04-25 [PTadmin] Official Update 2002-02
// 0 !HISTORY 2007-06-22 [PTadmin] Header formatted for Contributor Agreement
// 0 !HISTORY 2008-07-01 [PTadmin] Official Update 2008-01
// 0 !HISTORY 2012-02-16 [Philo] Changed to CCW
// 0 !HISTORY 2012-03-30 [PTadmin] Official Update 2012-01
// 
// 
// 4 16 1 1 0 0.9239 1 0.3827 0.9239 0 0.3827 1 0 0
  [4,16,1,1,0,0.9239,1,0.3827,0.9239,0,0.3827,1,0,0],
// 5 24 1 0 0 1 1 0 0.9239 0 0.3827 1 0 -1
  [5,24,1,0,0,1,1,0,0.9239,0,0.3827,1,0,-1],
// 4 16 0.9239 1 0.3827 0.7071 1 0.7071 0.7071 0 0.7071 0.9239 0 0.3827
  [4,16,0.9239,1,0.3827,0.7071,1,0.7071,0.7071,0,0.7071,0.9239,0,0.3827],
// 5 24 0.9239 0 0.3827 0.9239 1 0.3827 0.7071 0 0.7071 1 0 0
  [5,24,0.9239,0,0.3827,0.9239,1,0.3827,0.7071,0,0.7071,1,0,0],
// 4 16 0.7071 1 0.7071 0.3827 1 0.9239 0.3827 0 0.9239 0.7071 0 0.7071
  [4,16,0.7071,1,0.7071,0.3827,1,0.9239,0.3827,0,0.9239,0.7071,0,0.7071],
// 5 24 0.7071 0 0.7071 0.7071 1 0.7071 0.3827 0 0.9239 0.9239 0 0.3827
  [5,24,0.7071,0,0.7071,0.7071,1,0.7071,0.3827,0,0.9239,0.9239,0,0.3827],
// 4 16 0.3827 1 0.9239 0 1 1 0 0 1 0.3827 0 0.9239
  [4,16,0.3827,1,0.9239,0,1,1,0,0,1,0.3827,0,0.9239],
// 5 24 0.3827 0 0.9239 0.3827 1 0.9239 0 0 1 0.7071 0 0.7071
  [5,24,0.3827,0,0.9239,0.3827,1,0.9239,0,0,1,0.7071,0,0.7071],
// 5 24 0 0 1 0 1 1 0.3827 0 0.9239 -1 0 1
  [5,24,0,0,1,0,1,1,0.3827,0,0.9239,-1,0,1],
];
module ldraw_lib__1_4cyli(step=0, col=false, unit=2/5, alt=false, line=0.2, solid=!$preview)
    makepoly(ldraw_lib__1_4cyli(), step=step, col=col, unit=unit, alt=alt, line=line, solid=solid);
ldraw_lib__1_4cyli(line=0.2);
// file: ../p/1-4chrd.scad
use <../lib.scad>
$fa=1; $fs=0.2;
function ldraw_lib__1_4chrd(realsolid=false) = [
// 0 Chord 0.25
// 0 Name: 1-4chrd.dat
// 0 Author: Tony Hafner [hafhead]
// 0 !LDRAW_ORG Primitive UPDATE 2012-02
// 0 !LICENSE Licensed under CC BY 2.0 and CC BY 4.0 : see CAreadme.txt
// 
// 0 BFC CERTIFY CCW
  [0,"BFC","CERTIFY"],
  [0,"BFC","CCW"],
// 
// 0 !HISTORY 2004-04-22 [PTadmin] Official Update 2004-02
// 0 !HISTORY 2007-10-09 [PTadmin] Header formatted for Contributor Agreement
// 0 !HISTORY 2008-07-01 [PTadmin] Official Update 2008-01
// 0 !HISTORY 2012-08-02 [MMR1988] Re-creation with PrimGen2 and Rectifier
// 0 !HISTORY 2012-08-09 [PTadmin] Official Update 2012-02
// 
// 
// 4 16 0.9239 0 0.3827 0.3827 0 0.9239 0 0 1 1 0 0
  [4,16,0.9239,0,0.3827,0.3827,0,0.9239,0,0,1,1,0,0],
// 3 16 0.7071 0 0.7071 0.3827 0 0.9239 0.9239 0 0.3827
  [3,16,0.7071,0,0.7071,0.3827,0,0.9239,0.9239,0,0.3827],
];
module ldraw_lib__1_4chrd(step=0, col=false, unit=2/5, alt=false, line=0.2, solid=!$preview)
    makepoly(ldraw_lib__1_4chrd(solid), step=step, col=col, unit=unit, alt=alt, line=line, solid=solid);
ldraw_lib__1_4chrd(line=0.2);
// file: 87079.scad
use <../lib.scad>
use <s/87079s01.scad>
function ldraw_lib__87079() = [
// 0 Tile  2 x  4 with Groove
// 0 Name: 87079.dat
// 0 Author: Tim Gould [timgould]
// 0 !LDRAW_ORG Part UPDATE 2012-03
// 0 !LICENSE Licensed under CC BY 4.0 : see CAreadme.txt
// 
// 0 BFC CERTIFY CCW
  [0,"BFC","CERTIFY"],
  [0,"BFC","CCW"],
// 
// 0 !HISTORY 2010-04-05 [PTadmin] Official Update 2010-01
// 0 !HISTORY 2012-09-30 [Philo] Subparted for patterns
// 0 !HISTORY 2012-12-28 [PTadmin] Official Update 2012-03
// 
// 
// 4 16 -40 0 -20 40 0 -20 40 0 20 -40 0 20
  [4,16,-40,0,-20,40,0,-20,40,0,20,-40,0,20],
// 1 16 0 0 0 1 0 0 0 1 0 0 0 1 s\87079s01.dat
  [1,16,0,0,0,1,0,0,0,1,0,0,0,1, ldraw_lib__s__87079s01()],
];
module ldraw_lib__87079(step=0, col=false, unit=2/5, alt=false, line=0.2, solid=!$preview)
    makepoly(ldraw_lib__87079(), step=step, col=col, unit=unit, alt=alt, line=line, solid=solid);
ldraw_lib__87079(line=0.2);
// file: 6177741d.scad
use <../lib.scad>
use <../p/1-4chrd.scad>
use <../p/1-4cyli.scad>
use <../p/box3u12.scad>
function ldraw_lib__6177741d() = [
// 0 Sticker  0.8 x  1.8 with Yellow Stripes on Transparent Background
// 0 Name: 6177741d.dat
// 0 Author: Massimo Maso [Sirio]
// 0 !LDRAW_ORG Part UPDATE 2025-05
// 0 !LICENSE Licensed under CC BY 4.0 : see CAreadme.txt
// 
// 0 BFC CERTIFY CCW
  [0,"BFC","CERTIFY"],
  [0,"BFC","CCW"],
// 
// 0 !KEYWORDS AMG, GT3, Mercedes, Set 75877, Speed Champions
// 
// 0 !HISTORY 2025-05-28 [OrionP] Official Update 2025-05
// 
// 
// 0 // Primitives
// 
// 1 16 -16.5 0 6.5 -1.5 0 0 0 -1 0 0 0 1.5 1-4chrd.dat
  [1,16,-16.5,0,6.5,-1.5,0,0,0,-1,0,0,0,1.5, ldraw_lib__1_4chrd()],
// 1 16 16.5 0 6.5 1.5 0 0 0 -1 0 0 0 1.5 1-4chrd.dat
  [1,16,16.5,0,6.5,1.5,0,0,0,-1,0,0,0,1.5, ldraw_lib__1_4chrd()],
// 1 16 0 -.25 0 16.5 0 0 0 .25 0 0 0 8 box3u12.dat
  [1,16,0,-.25,0,16.5,0,0,0,.25,0,0,0,8, ldraw_lib__box3u12()],
// 1 16 -16.5 0 -6.5 -1.5 0 0 0 -1 0 0 0 -1.5 1-4chrd.dat
  [1,16,-16.5,0,-6.5,-1.5,0,0,0,-1,0,0,0,-1.5, ldraw_lib__1_4chrd()],
// 1 16 16.5 0 -6.5 1.5 0 0 0 -1 0 0 0 -1.5 1-4chrd.dat
  [1,16,16.5,0,-6.5,1.5,0,0,0,-1,0,0,0,-1.5, ldraw_lib__1_4chrd()],
// 1 16 -16.5 0 6.5 -1.5 0 0 0 -.25 0 0 0 1.5 1-4cyli.dat
  [1,16,-16.5,0,6.5,-1.5,0,0,0,-.25,0,0,0,1.5, ldraw_lib__1_4cyli()],
// 1 16 16.5 0 6.5 1.5 0 0 0 -.25 0 0 0 1.5 1-4cyli.dat
  [1,16,16.5,0,6.5,1.5,0,0,0,-.25,0,0,0,1.5, ldraw_lib__1_4cyli()],
// 1 16 -16.5 0 -6.5 -1.5 0 0 0 -.25 0 0 0 -1.5 1-4cyli.dat
  [1,16,-16.5,0,-6.5,-1.5,0,0,0,-.25,0,0,0,-1.5, ldraw_lib__1_4cyli()],
// 1 16 16.5 0 -6.5 1.5 0 0 0 -.25 0 0 0 -1.5 1-4cyli.dat
  [1,16,16.5,0,-6.5,1.5,0,0,0,-.25,0,0,0,-1.5, ldraw_lib__1_4cyli()],
// 1 16 -16.5 -.25 6.5 -1.5 0 0 0 1 0 0 0 1.5 1-4chrd.dat
  [1,16,-16.5,-.25,6.5,-1.5,0,0,0,1,0,0,0,1.5, ldraw_lib__1_4chrd()],
// 1 16 16.5 -.25 6.5 1.5 0 0 0 1 0 0 0 1.5 1-4chrd.dat
  [1,16,16.5,-.25,6.5,1.5,0,0,0,1,0,0,0,1.5, ldraw_lib__1_4chrd()],
// 0 BFC NOCLIP
  [0,"BFC","NOCLIP"],
// 1 14 -16.5 -.25 -6.5 -1.5 0 0 0 1 0 0 0 -1.5 1-4chrd.dat
  [1,14,-16.5,-.25,-6.5,-1.5,0,0,0,1,0,0,0,-1.5, ldraw_lib__1_4chrd()],
// 1 14 16.5 -.25 -6.5 1.5 0 0 0 1 0 0 0 -1.5 1-4chrd.dat
  [1,14,16.5,-.25,-6.5,1.5,0,0,0,1,0,0,0,-1.5, ldraw_lib__1_4chrd()],
// 0 BFC CLIP
  [0,"BFC","CLIP"],
// 0 // Bottom face
// 4 16 -16.5 0 8 -16.5 0 -8 -18 0 -6.5 -18 0 6.5
  [4,16,-16.5,0,8,-16.5,0,-8,-18,0,-6.5,-18,0,6.5],
// 4 16 16.5 0 8 18 0 6.5 18 0 -6.5 16.5 0 -8
  [4,16,16.5,0,8,18,0,6.5,18,0,-6.5,16.5,0,-8],
// 0 // Lateral face
// 3 16 -18 0 6.5 -18 -.25 5.2 -18 -.25 6.5
  [3,16,-18,0,6.5,-18,-.25,5.2,-18,-.25,6.5],
// 3 16 -18 0 6.5 -18 -.25 3 -18 -.25 5.2
  [3,16,-18,0,6.5,-18,-.25,3,-18,-.25,5.2],
// 4 16 -18 0 -6.5 -18 -.25 1.8 -18 -.25 3 -18 0 6.5
  [4,16,-18,0,-6.5,-18,-.25,1.8,-18,-.25,3,-18,0,6.5],
// 3 16 -18 0 -6.5 -18 -.25 -6.5 -18 -.25 1.8
  [3,16,-18,0,-6.5,-18,-.25,-6.5,-18,-.25,1.8],
// 3 16 18 0 6.5 18 -.25 6.5 18 -.25 5.2
  [3,16,18,0,6.5,18,-.25,6.5,18,-.25,5.2],
// 3 16 18 0 6.5 18 -.25 5.2 18 -.25 3
  [3,16,18,0,6.5,18,-.25,5.2,18,-.25,3],
// 4 16 18 0 -6.5 18 0 6.5 18 -.25 3 18 -.25 1.8
  [4,16,18,0,-6.5,18,0,6.5,18,-.25,3,18,-.25,1.8],
// 3 16 18 0 -6.5 18 -.25 1.8 18 -.25 -6.5
  [3,16,18,0,-6.5,18,-.25,1.8,18,-.25,-6.5],
// 0 // Top face
// 0 // Neutral faces
// 0 // First stirpe faces
// 4 16 -18 -.25 6.5 18 -.25 6.5 16.5 -.25 8 -16.5 -.25 8
  [4,16,-18,-.25,6.5,18,-.25,6.5,16.5,-.25,8,-16.5,-.25,8],
// 4 16 -18 -.25 6.5 -18 -.25 5.2 18 -.25 5.2 18 -.25 6.5
  [4,16,-18,-.25,6.5,-18,-.25,5.2,18,-.25,5.2,18,-.25,6.5],
// 0 // Second stripe faces
// 4 16 -18 -.25 3 -18 -.25 1.8 18 -.25 1.8 18 -.25 3
  [4,16,-18,-.25,3,-18,-.25,1.8,18,-.25,1.8,18,-.25,3],
// 0 BFC NOCLIP
  [0,"BFC","NOCLIP"],
// 0 // Yellow faces
// 0 // First stirpe faces
// 4 14 -18 -.25 3 18 -.25 3 18 -.25 5.2 -18 -.25 5.2
  [4,14,-18,-.25,3,18,-.25,3,18,-.25,5.2,-18,-.25,5.2],
// 0 // Second stripe faces
// 4 14 -18 -.25 -6.5 18 -.25 -6.5 18 -.25 1.8 -18 -.25 1.8
  [4,14,-18,-.25,-6.5,18,-.25,-6.5,18,-.25,1.8,-18,-.25,1.8],
// 4 14 -18 -.25 -6.5 -16.5 -.25 -8 16.5 -.25 -8 18 -.25 -6.5
  [4,14,-18,-.25,-6.5,-16.5,-.25,-8,16.5,-.25,-8,18,-.25,-6.5],
];
module ldraw_lib__6177741d(step=0, col=false, unit=2/5, alt=false, line=0.2, solid=!$preview)
    makepoly(ldraw_lib__6177741d(), step=step, col=col, unit=unit, alt=alt, line=line, solid=solid);
ldraw_lib__6177741d(line=0.2);
// main file
use <../lib.scad>
use <6177741d.scad>
use <87079.scad>
function ldraw_lib__87079d1g() = [
// 0 Tile  2 x  4 with Yellow Stripes on Transparent Background Sticker
// 0 Name: 87079d1g.dat
// 0 Author: Alfred Schmitz [AlfredS]
// 0 !LDRAW_ORG Shortcut UPDATE 2026-08
// 0 !LICENSE Licensed under CC BY 4.0 : see CAreadme.txt
// 
// 0 BFC CERTIFY CCW
  [0,"BFC","CERTIFY"],
  [0,"BFC","CCW"],
// 
// 0 !CATEGORY Sticker Shortcut
// 0 !KEYWORDS AMG, GT3, Mercedes, Set 75877, Speed Champions
// 
// 0 !HISTORY 2026-08-31 [OrionP] Official Update 2026-08
// 
// 1 16 0 0 0 1 0 0 0 1 0 0 0 1 87079.dat
  [1,16,0,0,0,1,0,0,0,1,0,0,0,1, ldraw_lib__87079()],
// 1 16 30 0 0 0 0 -1 0 1 0 1 0 0 6177741d.dat
  [1,16,30,0,0,0,0,-1,0,1,0,1,0,0, ldraw_lib__6177741d()],
];
module ldraw_lib__87079d1g(step=0, col=false, unit=2/5, alt=false, line=0.2, solid=!$preview)
    makepoly(ldraw_lib__87079d1g(), step=step, col=col, unit=unit, alt=alt, line=line, solid=solid);
ldraw_lib__87079d1g(line=0.2);
